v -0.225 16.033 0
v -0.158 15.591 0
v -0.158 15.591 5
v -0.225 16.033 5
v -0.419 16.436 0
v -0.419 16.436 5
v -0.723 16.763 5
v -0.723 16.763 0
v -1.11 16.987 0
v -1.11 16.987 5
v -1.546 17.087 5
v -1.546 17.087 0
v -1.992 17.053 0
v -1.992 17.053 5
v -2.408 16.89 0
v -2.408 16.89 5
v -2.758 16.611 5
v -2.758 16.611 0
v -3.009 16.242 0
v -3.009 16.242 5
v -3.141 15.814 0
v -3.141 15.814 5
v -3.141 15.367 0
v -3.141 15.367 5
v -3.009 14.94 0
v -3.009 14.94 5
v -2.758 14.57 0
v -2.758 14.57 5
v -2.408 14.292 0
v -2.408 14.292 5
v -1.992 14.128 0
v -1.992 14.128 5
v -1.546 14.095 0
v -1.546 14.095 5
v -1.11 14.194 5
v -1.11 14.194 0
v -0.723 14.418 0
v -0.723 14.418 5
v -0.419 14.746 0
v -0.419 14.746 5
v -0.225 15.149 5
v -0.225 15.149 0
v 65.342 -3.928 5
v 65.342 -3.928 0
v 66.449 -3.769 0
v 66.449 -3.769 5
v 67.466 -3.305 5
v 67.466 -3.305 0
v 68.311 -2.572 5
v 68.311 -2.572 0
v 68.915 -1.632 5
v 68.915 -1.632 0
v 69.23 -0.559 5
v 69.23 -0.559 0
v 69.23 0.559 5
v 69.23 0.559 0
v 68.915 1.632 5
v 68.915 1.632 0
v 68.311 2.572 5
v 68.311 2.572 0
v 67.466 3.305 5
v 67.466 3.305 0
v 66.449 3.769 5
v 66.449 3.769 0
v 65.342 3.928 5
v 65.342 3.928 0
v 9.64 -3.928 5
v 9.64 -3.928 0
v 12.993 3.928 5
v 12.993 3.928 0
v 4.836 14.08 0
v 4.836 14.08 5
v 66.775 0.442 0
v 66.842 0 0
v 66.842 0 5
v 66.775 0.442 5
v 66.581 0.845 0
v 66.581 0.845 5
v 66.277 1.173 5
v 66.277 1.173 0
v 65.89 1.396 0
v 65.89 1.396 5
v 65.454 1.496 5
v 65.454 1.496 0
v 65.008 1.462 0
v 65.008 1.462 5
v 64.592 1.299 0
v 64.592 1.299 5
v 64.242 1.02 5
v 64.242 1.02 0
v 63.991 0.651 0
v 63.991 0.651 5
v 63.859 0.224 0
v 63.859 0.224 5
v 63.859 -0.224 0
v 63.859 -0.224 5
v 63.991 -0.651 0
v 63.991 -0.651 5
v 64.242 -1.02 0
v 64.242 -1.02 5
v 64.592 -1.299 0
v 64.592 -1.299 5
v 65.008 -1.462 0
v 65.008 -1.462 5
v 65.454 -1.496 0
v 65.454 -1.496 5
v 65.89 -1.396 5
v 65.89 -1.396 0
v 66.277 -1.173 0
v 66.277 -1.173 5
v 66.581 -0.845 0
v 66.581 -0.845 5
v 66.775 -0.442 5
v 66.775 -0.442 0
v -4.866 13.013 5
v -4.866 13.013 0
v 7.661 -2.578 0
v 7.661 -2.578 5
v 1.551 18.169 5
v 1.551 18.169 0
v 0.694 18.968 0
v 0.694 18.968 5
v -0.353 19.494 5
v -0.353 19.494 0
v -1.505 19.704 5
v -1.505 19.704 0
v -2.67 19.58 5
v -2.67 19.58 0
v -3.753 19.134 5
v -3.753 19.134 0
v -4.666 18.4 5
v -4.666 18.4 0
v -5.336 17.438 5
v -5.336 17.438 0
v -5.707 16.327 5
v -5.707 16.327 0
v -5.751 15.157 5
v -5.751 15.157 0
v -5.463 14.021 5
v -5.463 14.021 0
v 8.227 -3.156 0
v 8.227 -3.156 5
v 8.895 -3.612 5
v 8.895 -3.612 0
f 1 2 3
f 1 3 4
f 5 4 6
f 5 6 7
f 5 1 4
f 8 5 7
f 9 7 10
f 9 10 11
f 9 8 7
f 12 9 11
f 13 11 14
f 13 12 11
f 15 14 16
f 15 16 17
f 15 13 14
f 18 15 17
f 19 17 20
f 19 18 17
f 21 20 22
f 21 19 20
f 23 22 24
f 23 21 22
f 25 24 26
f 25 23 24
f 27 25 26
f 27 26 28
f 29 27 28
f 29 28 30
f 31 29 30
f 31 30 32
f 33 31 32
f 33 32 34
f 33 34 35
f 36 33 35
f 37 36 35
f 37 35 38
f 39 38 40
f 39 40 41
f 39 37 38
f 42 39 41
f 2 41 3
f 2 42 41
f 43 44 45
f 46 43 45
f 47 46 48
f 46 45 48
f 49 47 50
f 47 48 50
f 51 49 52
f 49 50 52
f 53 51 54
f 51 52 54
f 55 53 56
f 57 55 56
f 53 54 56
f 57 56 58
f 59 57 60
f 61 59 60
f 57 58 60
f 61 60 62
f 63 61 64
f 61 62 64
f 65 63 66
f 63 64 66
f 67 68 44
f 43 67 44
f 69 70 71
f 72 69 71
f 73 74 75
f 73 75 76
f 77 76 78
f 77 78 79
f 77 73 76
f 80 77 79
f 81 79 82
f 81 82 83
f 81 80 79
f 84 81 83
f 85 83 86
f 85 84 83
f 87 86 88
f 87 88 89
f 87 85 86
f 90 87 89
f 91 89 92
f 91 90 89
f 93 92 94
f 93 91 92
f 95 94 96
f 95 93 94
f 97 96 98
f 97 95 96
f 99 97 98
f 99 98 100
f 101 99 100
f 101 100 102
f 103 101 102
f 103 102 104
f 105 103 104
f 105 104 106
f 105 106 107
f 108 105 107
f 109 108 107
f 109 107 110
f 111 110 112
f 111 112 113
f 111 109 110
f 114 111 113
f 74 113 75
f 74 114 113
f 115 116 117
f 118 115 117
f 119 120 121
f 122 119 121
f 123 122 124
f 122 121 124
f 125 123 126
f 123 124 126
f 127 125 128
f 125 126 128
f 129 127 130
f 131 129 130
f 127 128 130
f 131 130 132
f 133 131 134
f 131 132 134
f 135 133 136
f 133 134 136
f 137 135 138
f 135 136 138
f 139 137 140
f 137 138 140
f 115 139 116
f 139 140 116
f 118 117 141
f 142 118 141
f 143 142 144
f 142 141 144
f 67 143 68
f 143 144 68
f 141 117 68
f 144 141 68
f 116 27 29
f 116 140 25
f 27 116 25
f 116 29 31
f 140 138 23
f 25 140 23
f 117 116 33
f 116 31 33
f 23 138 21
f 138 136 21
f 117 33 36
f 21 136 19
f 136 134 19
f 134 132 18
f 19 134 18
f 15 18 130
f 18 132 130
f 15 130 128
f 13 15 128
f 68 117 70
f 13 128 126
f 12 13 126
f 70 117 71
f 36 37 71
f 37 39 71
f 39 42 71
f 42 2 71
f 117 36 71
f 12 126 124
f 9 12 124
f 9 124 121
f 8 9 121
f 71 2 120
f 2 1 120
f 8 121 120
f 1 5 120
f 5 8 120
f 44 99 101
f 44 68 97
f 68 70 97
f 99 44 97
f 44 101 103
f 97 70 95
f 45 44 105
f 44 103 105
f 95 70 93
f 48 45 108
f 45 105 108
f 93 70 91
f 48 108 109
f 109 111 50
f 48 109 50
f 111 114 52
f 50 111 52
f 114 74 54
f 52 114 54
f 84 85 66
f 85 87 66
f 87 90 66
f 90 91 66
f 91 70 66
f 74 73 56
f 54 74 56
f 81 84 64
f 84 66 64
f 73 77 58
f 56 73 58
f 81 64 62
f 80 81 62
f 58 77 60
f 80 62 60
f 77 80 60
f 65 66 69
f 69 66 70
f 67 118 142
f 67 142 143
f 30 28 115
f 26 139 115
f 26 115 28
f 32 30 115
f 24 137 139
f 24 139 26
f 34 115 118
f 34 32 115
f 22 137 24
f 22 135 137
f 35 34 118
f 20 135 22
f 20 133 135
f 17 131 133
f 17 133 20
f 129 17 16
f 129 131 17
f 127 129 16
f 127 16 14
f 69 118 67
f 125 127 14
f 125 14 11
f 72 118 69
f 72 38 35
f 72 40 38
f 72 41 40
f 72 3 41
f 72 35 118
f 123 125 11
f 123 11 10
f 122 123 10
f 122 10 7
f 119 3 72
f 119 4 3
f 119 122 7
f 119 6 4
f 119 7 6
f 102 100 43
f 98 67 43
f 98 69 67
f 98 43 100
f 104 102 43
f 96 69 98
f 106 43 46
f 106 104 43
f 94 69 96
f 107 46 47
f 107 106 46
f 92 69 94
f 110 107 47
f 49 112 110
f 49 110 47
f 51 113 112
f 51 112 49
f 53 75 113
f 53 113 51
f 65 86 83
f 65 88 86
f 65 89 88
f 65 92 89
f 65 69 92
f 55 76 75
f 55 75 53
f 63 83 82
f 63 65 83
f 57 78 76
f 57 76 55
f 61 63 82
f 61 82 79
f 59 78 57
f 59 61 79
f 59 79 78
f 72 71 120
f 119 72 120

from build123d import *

# Parameters (mm, degrees)
SKETCH1_R           = 1.5
BOSS_EXTRUDE2_DEPTH = 5


with BuildPart() as part:
    # Sketch1 → Boss-Extrude2 (new body)
    with BuildSketch(Plane.XY):
        with BuildLine():
            ThreePointArc((1.550594596, 18.168790447), (-4.235995189, 18.799274261), (-4.866479002, 13.012684476))
            Line((-4.866479002, 13.012684476), (7.66064778, -2.578052986))
            ThreePointArc((7.66064778, -2.578052986), (8.549937722, -3.400317574), (9.640055191, -3.928142886))
            Line((9.640055191, -3.928142886), (65.342057797, -3.928142886))
            ThreePointArc((65.342057797, -3.928142886), (69.270200683, 0), (65.342057797, 3.928142886))
            Line((65.342057797, 3.928142886), (48.461164636, 3.928142886))
            Line((48.461164636, 3.928142886), (12.992926807, 3.928142886))
            Line((12.992926807, 3.928142886), (4.83629607, 14.07954397))
            Line((4.83629607, 14.07954397), (1.550594596, 18.168790447))
        make_face()
        with Locations((-1.657942203, 15.590737462)):
            Circle(SKETCH1_R, mode=Mode.SUBTRACT)
        with Locations((65.342057797, 0)):
            Circle(SKETCH1_R, mode=Mode.SUBTRACT)
    extrude(amount=BOSS_EXTRUDE2_DEPTH)


solid = part.part
